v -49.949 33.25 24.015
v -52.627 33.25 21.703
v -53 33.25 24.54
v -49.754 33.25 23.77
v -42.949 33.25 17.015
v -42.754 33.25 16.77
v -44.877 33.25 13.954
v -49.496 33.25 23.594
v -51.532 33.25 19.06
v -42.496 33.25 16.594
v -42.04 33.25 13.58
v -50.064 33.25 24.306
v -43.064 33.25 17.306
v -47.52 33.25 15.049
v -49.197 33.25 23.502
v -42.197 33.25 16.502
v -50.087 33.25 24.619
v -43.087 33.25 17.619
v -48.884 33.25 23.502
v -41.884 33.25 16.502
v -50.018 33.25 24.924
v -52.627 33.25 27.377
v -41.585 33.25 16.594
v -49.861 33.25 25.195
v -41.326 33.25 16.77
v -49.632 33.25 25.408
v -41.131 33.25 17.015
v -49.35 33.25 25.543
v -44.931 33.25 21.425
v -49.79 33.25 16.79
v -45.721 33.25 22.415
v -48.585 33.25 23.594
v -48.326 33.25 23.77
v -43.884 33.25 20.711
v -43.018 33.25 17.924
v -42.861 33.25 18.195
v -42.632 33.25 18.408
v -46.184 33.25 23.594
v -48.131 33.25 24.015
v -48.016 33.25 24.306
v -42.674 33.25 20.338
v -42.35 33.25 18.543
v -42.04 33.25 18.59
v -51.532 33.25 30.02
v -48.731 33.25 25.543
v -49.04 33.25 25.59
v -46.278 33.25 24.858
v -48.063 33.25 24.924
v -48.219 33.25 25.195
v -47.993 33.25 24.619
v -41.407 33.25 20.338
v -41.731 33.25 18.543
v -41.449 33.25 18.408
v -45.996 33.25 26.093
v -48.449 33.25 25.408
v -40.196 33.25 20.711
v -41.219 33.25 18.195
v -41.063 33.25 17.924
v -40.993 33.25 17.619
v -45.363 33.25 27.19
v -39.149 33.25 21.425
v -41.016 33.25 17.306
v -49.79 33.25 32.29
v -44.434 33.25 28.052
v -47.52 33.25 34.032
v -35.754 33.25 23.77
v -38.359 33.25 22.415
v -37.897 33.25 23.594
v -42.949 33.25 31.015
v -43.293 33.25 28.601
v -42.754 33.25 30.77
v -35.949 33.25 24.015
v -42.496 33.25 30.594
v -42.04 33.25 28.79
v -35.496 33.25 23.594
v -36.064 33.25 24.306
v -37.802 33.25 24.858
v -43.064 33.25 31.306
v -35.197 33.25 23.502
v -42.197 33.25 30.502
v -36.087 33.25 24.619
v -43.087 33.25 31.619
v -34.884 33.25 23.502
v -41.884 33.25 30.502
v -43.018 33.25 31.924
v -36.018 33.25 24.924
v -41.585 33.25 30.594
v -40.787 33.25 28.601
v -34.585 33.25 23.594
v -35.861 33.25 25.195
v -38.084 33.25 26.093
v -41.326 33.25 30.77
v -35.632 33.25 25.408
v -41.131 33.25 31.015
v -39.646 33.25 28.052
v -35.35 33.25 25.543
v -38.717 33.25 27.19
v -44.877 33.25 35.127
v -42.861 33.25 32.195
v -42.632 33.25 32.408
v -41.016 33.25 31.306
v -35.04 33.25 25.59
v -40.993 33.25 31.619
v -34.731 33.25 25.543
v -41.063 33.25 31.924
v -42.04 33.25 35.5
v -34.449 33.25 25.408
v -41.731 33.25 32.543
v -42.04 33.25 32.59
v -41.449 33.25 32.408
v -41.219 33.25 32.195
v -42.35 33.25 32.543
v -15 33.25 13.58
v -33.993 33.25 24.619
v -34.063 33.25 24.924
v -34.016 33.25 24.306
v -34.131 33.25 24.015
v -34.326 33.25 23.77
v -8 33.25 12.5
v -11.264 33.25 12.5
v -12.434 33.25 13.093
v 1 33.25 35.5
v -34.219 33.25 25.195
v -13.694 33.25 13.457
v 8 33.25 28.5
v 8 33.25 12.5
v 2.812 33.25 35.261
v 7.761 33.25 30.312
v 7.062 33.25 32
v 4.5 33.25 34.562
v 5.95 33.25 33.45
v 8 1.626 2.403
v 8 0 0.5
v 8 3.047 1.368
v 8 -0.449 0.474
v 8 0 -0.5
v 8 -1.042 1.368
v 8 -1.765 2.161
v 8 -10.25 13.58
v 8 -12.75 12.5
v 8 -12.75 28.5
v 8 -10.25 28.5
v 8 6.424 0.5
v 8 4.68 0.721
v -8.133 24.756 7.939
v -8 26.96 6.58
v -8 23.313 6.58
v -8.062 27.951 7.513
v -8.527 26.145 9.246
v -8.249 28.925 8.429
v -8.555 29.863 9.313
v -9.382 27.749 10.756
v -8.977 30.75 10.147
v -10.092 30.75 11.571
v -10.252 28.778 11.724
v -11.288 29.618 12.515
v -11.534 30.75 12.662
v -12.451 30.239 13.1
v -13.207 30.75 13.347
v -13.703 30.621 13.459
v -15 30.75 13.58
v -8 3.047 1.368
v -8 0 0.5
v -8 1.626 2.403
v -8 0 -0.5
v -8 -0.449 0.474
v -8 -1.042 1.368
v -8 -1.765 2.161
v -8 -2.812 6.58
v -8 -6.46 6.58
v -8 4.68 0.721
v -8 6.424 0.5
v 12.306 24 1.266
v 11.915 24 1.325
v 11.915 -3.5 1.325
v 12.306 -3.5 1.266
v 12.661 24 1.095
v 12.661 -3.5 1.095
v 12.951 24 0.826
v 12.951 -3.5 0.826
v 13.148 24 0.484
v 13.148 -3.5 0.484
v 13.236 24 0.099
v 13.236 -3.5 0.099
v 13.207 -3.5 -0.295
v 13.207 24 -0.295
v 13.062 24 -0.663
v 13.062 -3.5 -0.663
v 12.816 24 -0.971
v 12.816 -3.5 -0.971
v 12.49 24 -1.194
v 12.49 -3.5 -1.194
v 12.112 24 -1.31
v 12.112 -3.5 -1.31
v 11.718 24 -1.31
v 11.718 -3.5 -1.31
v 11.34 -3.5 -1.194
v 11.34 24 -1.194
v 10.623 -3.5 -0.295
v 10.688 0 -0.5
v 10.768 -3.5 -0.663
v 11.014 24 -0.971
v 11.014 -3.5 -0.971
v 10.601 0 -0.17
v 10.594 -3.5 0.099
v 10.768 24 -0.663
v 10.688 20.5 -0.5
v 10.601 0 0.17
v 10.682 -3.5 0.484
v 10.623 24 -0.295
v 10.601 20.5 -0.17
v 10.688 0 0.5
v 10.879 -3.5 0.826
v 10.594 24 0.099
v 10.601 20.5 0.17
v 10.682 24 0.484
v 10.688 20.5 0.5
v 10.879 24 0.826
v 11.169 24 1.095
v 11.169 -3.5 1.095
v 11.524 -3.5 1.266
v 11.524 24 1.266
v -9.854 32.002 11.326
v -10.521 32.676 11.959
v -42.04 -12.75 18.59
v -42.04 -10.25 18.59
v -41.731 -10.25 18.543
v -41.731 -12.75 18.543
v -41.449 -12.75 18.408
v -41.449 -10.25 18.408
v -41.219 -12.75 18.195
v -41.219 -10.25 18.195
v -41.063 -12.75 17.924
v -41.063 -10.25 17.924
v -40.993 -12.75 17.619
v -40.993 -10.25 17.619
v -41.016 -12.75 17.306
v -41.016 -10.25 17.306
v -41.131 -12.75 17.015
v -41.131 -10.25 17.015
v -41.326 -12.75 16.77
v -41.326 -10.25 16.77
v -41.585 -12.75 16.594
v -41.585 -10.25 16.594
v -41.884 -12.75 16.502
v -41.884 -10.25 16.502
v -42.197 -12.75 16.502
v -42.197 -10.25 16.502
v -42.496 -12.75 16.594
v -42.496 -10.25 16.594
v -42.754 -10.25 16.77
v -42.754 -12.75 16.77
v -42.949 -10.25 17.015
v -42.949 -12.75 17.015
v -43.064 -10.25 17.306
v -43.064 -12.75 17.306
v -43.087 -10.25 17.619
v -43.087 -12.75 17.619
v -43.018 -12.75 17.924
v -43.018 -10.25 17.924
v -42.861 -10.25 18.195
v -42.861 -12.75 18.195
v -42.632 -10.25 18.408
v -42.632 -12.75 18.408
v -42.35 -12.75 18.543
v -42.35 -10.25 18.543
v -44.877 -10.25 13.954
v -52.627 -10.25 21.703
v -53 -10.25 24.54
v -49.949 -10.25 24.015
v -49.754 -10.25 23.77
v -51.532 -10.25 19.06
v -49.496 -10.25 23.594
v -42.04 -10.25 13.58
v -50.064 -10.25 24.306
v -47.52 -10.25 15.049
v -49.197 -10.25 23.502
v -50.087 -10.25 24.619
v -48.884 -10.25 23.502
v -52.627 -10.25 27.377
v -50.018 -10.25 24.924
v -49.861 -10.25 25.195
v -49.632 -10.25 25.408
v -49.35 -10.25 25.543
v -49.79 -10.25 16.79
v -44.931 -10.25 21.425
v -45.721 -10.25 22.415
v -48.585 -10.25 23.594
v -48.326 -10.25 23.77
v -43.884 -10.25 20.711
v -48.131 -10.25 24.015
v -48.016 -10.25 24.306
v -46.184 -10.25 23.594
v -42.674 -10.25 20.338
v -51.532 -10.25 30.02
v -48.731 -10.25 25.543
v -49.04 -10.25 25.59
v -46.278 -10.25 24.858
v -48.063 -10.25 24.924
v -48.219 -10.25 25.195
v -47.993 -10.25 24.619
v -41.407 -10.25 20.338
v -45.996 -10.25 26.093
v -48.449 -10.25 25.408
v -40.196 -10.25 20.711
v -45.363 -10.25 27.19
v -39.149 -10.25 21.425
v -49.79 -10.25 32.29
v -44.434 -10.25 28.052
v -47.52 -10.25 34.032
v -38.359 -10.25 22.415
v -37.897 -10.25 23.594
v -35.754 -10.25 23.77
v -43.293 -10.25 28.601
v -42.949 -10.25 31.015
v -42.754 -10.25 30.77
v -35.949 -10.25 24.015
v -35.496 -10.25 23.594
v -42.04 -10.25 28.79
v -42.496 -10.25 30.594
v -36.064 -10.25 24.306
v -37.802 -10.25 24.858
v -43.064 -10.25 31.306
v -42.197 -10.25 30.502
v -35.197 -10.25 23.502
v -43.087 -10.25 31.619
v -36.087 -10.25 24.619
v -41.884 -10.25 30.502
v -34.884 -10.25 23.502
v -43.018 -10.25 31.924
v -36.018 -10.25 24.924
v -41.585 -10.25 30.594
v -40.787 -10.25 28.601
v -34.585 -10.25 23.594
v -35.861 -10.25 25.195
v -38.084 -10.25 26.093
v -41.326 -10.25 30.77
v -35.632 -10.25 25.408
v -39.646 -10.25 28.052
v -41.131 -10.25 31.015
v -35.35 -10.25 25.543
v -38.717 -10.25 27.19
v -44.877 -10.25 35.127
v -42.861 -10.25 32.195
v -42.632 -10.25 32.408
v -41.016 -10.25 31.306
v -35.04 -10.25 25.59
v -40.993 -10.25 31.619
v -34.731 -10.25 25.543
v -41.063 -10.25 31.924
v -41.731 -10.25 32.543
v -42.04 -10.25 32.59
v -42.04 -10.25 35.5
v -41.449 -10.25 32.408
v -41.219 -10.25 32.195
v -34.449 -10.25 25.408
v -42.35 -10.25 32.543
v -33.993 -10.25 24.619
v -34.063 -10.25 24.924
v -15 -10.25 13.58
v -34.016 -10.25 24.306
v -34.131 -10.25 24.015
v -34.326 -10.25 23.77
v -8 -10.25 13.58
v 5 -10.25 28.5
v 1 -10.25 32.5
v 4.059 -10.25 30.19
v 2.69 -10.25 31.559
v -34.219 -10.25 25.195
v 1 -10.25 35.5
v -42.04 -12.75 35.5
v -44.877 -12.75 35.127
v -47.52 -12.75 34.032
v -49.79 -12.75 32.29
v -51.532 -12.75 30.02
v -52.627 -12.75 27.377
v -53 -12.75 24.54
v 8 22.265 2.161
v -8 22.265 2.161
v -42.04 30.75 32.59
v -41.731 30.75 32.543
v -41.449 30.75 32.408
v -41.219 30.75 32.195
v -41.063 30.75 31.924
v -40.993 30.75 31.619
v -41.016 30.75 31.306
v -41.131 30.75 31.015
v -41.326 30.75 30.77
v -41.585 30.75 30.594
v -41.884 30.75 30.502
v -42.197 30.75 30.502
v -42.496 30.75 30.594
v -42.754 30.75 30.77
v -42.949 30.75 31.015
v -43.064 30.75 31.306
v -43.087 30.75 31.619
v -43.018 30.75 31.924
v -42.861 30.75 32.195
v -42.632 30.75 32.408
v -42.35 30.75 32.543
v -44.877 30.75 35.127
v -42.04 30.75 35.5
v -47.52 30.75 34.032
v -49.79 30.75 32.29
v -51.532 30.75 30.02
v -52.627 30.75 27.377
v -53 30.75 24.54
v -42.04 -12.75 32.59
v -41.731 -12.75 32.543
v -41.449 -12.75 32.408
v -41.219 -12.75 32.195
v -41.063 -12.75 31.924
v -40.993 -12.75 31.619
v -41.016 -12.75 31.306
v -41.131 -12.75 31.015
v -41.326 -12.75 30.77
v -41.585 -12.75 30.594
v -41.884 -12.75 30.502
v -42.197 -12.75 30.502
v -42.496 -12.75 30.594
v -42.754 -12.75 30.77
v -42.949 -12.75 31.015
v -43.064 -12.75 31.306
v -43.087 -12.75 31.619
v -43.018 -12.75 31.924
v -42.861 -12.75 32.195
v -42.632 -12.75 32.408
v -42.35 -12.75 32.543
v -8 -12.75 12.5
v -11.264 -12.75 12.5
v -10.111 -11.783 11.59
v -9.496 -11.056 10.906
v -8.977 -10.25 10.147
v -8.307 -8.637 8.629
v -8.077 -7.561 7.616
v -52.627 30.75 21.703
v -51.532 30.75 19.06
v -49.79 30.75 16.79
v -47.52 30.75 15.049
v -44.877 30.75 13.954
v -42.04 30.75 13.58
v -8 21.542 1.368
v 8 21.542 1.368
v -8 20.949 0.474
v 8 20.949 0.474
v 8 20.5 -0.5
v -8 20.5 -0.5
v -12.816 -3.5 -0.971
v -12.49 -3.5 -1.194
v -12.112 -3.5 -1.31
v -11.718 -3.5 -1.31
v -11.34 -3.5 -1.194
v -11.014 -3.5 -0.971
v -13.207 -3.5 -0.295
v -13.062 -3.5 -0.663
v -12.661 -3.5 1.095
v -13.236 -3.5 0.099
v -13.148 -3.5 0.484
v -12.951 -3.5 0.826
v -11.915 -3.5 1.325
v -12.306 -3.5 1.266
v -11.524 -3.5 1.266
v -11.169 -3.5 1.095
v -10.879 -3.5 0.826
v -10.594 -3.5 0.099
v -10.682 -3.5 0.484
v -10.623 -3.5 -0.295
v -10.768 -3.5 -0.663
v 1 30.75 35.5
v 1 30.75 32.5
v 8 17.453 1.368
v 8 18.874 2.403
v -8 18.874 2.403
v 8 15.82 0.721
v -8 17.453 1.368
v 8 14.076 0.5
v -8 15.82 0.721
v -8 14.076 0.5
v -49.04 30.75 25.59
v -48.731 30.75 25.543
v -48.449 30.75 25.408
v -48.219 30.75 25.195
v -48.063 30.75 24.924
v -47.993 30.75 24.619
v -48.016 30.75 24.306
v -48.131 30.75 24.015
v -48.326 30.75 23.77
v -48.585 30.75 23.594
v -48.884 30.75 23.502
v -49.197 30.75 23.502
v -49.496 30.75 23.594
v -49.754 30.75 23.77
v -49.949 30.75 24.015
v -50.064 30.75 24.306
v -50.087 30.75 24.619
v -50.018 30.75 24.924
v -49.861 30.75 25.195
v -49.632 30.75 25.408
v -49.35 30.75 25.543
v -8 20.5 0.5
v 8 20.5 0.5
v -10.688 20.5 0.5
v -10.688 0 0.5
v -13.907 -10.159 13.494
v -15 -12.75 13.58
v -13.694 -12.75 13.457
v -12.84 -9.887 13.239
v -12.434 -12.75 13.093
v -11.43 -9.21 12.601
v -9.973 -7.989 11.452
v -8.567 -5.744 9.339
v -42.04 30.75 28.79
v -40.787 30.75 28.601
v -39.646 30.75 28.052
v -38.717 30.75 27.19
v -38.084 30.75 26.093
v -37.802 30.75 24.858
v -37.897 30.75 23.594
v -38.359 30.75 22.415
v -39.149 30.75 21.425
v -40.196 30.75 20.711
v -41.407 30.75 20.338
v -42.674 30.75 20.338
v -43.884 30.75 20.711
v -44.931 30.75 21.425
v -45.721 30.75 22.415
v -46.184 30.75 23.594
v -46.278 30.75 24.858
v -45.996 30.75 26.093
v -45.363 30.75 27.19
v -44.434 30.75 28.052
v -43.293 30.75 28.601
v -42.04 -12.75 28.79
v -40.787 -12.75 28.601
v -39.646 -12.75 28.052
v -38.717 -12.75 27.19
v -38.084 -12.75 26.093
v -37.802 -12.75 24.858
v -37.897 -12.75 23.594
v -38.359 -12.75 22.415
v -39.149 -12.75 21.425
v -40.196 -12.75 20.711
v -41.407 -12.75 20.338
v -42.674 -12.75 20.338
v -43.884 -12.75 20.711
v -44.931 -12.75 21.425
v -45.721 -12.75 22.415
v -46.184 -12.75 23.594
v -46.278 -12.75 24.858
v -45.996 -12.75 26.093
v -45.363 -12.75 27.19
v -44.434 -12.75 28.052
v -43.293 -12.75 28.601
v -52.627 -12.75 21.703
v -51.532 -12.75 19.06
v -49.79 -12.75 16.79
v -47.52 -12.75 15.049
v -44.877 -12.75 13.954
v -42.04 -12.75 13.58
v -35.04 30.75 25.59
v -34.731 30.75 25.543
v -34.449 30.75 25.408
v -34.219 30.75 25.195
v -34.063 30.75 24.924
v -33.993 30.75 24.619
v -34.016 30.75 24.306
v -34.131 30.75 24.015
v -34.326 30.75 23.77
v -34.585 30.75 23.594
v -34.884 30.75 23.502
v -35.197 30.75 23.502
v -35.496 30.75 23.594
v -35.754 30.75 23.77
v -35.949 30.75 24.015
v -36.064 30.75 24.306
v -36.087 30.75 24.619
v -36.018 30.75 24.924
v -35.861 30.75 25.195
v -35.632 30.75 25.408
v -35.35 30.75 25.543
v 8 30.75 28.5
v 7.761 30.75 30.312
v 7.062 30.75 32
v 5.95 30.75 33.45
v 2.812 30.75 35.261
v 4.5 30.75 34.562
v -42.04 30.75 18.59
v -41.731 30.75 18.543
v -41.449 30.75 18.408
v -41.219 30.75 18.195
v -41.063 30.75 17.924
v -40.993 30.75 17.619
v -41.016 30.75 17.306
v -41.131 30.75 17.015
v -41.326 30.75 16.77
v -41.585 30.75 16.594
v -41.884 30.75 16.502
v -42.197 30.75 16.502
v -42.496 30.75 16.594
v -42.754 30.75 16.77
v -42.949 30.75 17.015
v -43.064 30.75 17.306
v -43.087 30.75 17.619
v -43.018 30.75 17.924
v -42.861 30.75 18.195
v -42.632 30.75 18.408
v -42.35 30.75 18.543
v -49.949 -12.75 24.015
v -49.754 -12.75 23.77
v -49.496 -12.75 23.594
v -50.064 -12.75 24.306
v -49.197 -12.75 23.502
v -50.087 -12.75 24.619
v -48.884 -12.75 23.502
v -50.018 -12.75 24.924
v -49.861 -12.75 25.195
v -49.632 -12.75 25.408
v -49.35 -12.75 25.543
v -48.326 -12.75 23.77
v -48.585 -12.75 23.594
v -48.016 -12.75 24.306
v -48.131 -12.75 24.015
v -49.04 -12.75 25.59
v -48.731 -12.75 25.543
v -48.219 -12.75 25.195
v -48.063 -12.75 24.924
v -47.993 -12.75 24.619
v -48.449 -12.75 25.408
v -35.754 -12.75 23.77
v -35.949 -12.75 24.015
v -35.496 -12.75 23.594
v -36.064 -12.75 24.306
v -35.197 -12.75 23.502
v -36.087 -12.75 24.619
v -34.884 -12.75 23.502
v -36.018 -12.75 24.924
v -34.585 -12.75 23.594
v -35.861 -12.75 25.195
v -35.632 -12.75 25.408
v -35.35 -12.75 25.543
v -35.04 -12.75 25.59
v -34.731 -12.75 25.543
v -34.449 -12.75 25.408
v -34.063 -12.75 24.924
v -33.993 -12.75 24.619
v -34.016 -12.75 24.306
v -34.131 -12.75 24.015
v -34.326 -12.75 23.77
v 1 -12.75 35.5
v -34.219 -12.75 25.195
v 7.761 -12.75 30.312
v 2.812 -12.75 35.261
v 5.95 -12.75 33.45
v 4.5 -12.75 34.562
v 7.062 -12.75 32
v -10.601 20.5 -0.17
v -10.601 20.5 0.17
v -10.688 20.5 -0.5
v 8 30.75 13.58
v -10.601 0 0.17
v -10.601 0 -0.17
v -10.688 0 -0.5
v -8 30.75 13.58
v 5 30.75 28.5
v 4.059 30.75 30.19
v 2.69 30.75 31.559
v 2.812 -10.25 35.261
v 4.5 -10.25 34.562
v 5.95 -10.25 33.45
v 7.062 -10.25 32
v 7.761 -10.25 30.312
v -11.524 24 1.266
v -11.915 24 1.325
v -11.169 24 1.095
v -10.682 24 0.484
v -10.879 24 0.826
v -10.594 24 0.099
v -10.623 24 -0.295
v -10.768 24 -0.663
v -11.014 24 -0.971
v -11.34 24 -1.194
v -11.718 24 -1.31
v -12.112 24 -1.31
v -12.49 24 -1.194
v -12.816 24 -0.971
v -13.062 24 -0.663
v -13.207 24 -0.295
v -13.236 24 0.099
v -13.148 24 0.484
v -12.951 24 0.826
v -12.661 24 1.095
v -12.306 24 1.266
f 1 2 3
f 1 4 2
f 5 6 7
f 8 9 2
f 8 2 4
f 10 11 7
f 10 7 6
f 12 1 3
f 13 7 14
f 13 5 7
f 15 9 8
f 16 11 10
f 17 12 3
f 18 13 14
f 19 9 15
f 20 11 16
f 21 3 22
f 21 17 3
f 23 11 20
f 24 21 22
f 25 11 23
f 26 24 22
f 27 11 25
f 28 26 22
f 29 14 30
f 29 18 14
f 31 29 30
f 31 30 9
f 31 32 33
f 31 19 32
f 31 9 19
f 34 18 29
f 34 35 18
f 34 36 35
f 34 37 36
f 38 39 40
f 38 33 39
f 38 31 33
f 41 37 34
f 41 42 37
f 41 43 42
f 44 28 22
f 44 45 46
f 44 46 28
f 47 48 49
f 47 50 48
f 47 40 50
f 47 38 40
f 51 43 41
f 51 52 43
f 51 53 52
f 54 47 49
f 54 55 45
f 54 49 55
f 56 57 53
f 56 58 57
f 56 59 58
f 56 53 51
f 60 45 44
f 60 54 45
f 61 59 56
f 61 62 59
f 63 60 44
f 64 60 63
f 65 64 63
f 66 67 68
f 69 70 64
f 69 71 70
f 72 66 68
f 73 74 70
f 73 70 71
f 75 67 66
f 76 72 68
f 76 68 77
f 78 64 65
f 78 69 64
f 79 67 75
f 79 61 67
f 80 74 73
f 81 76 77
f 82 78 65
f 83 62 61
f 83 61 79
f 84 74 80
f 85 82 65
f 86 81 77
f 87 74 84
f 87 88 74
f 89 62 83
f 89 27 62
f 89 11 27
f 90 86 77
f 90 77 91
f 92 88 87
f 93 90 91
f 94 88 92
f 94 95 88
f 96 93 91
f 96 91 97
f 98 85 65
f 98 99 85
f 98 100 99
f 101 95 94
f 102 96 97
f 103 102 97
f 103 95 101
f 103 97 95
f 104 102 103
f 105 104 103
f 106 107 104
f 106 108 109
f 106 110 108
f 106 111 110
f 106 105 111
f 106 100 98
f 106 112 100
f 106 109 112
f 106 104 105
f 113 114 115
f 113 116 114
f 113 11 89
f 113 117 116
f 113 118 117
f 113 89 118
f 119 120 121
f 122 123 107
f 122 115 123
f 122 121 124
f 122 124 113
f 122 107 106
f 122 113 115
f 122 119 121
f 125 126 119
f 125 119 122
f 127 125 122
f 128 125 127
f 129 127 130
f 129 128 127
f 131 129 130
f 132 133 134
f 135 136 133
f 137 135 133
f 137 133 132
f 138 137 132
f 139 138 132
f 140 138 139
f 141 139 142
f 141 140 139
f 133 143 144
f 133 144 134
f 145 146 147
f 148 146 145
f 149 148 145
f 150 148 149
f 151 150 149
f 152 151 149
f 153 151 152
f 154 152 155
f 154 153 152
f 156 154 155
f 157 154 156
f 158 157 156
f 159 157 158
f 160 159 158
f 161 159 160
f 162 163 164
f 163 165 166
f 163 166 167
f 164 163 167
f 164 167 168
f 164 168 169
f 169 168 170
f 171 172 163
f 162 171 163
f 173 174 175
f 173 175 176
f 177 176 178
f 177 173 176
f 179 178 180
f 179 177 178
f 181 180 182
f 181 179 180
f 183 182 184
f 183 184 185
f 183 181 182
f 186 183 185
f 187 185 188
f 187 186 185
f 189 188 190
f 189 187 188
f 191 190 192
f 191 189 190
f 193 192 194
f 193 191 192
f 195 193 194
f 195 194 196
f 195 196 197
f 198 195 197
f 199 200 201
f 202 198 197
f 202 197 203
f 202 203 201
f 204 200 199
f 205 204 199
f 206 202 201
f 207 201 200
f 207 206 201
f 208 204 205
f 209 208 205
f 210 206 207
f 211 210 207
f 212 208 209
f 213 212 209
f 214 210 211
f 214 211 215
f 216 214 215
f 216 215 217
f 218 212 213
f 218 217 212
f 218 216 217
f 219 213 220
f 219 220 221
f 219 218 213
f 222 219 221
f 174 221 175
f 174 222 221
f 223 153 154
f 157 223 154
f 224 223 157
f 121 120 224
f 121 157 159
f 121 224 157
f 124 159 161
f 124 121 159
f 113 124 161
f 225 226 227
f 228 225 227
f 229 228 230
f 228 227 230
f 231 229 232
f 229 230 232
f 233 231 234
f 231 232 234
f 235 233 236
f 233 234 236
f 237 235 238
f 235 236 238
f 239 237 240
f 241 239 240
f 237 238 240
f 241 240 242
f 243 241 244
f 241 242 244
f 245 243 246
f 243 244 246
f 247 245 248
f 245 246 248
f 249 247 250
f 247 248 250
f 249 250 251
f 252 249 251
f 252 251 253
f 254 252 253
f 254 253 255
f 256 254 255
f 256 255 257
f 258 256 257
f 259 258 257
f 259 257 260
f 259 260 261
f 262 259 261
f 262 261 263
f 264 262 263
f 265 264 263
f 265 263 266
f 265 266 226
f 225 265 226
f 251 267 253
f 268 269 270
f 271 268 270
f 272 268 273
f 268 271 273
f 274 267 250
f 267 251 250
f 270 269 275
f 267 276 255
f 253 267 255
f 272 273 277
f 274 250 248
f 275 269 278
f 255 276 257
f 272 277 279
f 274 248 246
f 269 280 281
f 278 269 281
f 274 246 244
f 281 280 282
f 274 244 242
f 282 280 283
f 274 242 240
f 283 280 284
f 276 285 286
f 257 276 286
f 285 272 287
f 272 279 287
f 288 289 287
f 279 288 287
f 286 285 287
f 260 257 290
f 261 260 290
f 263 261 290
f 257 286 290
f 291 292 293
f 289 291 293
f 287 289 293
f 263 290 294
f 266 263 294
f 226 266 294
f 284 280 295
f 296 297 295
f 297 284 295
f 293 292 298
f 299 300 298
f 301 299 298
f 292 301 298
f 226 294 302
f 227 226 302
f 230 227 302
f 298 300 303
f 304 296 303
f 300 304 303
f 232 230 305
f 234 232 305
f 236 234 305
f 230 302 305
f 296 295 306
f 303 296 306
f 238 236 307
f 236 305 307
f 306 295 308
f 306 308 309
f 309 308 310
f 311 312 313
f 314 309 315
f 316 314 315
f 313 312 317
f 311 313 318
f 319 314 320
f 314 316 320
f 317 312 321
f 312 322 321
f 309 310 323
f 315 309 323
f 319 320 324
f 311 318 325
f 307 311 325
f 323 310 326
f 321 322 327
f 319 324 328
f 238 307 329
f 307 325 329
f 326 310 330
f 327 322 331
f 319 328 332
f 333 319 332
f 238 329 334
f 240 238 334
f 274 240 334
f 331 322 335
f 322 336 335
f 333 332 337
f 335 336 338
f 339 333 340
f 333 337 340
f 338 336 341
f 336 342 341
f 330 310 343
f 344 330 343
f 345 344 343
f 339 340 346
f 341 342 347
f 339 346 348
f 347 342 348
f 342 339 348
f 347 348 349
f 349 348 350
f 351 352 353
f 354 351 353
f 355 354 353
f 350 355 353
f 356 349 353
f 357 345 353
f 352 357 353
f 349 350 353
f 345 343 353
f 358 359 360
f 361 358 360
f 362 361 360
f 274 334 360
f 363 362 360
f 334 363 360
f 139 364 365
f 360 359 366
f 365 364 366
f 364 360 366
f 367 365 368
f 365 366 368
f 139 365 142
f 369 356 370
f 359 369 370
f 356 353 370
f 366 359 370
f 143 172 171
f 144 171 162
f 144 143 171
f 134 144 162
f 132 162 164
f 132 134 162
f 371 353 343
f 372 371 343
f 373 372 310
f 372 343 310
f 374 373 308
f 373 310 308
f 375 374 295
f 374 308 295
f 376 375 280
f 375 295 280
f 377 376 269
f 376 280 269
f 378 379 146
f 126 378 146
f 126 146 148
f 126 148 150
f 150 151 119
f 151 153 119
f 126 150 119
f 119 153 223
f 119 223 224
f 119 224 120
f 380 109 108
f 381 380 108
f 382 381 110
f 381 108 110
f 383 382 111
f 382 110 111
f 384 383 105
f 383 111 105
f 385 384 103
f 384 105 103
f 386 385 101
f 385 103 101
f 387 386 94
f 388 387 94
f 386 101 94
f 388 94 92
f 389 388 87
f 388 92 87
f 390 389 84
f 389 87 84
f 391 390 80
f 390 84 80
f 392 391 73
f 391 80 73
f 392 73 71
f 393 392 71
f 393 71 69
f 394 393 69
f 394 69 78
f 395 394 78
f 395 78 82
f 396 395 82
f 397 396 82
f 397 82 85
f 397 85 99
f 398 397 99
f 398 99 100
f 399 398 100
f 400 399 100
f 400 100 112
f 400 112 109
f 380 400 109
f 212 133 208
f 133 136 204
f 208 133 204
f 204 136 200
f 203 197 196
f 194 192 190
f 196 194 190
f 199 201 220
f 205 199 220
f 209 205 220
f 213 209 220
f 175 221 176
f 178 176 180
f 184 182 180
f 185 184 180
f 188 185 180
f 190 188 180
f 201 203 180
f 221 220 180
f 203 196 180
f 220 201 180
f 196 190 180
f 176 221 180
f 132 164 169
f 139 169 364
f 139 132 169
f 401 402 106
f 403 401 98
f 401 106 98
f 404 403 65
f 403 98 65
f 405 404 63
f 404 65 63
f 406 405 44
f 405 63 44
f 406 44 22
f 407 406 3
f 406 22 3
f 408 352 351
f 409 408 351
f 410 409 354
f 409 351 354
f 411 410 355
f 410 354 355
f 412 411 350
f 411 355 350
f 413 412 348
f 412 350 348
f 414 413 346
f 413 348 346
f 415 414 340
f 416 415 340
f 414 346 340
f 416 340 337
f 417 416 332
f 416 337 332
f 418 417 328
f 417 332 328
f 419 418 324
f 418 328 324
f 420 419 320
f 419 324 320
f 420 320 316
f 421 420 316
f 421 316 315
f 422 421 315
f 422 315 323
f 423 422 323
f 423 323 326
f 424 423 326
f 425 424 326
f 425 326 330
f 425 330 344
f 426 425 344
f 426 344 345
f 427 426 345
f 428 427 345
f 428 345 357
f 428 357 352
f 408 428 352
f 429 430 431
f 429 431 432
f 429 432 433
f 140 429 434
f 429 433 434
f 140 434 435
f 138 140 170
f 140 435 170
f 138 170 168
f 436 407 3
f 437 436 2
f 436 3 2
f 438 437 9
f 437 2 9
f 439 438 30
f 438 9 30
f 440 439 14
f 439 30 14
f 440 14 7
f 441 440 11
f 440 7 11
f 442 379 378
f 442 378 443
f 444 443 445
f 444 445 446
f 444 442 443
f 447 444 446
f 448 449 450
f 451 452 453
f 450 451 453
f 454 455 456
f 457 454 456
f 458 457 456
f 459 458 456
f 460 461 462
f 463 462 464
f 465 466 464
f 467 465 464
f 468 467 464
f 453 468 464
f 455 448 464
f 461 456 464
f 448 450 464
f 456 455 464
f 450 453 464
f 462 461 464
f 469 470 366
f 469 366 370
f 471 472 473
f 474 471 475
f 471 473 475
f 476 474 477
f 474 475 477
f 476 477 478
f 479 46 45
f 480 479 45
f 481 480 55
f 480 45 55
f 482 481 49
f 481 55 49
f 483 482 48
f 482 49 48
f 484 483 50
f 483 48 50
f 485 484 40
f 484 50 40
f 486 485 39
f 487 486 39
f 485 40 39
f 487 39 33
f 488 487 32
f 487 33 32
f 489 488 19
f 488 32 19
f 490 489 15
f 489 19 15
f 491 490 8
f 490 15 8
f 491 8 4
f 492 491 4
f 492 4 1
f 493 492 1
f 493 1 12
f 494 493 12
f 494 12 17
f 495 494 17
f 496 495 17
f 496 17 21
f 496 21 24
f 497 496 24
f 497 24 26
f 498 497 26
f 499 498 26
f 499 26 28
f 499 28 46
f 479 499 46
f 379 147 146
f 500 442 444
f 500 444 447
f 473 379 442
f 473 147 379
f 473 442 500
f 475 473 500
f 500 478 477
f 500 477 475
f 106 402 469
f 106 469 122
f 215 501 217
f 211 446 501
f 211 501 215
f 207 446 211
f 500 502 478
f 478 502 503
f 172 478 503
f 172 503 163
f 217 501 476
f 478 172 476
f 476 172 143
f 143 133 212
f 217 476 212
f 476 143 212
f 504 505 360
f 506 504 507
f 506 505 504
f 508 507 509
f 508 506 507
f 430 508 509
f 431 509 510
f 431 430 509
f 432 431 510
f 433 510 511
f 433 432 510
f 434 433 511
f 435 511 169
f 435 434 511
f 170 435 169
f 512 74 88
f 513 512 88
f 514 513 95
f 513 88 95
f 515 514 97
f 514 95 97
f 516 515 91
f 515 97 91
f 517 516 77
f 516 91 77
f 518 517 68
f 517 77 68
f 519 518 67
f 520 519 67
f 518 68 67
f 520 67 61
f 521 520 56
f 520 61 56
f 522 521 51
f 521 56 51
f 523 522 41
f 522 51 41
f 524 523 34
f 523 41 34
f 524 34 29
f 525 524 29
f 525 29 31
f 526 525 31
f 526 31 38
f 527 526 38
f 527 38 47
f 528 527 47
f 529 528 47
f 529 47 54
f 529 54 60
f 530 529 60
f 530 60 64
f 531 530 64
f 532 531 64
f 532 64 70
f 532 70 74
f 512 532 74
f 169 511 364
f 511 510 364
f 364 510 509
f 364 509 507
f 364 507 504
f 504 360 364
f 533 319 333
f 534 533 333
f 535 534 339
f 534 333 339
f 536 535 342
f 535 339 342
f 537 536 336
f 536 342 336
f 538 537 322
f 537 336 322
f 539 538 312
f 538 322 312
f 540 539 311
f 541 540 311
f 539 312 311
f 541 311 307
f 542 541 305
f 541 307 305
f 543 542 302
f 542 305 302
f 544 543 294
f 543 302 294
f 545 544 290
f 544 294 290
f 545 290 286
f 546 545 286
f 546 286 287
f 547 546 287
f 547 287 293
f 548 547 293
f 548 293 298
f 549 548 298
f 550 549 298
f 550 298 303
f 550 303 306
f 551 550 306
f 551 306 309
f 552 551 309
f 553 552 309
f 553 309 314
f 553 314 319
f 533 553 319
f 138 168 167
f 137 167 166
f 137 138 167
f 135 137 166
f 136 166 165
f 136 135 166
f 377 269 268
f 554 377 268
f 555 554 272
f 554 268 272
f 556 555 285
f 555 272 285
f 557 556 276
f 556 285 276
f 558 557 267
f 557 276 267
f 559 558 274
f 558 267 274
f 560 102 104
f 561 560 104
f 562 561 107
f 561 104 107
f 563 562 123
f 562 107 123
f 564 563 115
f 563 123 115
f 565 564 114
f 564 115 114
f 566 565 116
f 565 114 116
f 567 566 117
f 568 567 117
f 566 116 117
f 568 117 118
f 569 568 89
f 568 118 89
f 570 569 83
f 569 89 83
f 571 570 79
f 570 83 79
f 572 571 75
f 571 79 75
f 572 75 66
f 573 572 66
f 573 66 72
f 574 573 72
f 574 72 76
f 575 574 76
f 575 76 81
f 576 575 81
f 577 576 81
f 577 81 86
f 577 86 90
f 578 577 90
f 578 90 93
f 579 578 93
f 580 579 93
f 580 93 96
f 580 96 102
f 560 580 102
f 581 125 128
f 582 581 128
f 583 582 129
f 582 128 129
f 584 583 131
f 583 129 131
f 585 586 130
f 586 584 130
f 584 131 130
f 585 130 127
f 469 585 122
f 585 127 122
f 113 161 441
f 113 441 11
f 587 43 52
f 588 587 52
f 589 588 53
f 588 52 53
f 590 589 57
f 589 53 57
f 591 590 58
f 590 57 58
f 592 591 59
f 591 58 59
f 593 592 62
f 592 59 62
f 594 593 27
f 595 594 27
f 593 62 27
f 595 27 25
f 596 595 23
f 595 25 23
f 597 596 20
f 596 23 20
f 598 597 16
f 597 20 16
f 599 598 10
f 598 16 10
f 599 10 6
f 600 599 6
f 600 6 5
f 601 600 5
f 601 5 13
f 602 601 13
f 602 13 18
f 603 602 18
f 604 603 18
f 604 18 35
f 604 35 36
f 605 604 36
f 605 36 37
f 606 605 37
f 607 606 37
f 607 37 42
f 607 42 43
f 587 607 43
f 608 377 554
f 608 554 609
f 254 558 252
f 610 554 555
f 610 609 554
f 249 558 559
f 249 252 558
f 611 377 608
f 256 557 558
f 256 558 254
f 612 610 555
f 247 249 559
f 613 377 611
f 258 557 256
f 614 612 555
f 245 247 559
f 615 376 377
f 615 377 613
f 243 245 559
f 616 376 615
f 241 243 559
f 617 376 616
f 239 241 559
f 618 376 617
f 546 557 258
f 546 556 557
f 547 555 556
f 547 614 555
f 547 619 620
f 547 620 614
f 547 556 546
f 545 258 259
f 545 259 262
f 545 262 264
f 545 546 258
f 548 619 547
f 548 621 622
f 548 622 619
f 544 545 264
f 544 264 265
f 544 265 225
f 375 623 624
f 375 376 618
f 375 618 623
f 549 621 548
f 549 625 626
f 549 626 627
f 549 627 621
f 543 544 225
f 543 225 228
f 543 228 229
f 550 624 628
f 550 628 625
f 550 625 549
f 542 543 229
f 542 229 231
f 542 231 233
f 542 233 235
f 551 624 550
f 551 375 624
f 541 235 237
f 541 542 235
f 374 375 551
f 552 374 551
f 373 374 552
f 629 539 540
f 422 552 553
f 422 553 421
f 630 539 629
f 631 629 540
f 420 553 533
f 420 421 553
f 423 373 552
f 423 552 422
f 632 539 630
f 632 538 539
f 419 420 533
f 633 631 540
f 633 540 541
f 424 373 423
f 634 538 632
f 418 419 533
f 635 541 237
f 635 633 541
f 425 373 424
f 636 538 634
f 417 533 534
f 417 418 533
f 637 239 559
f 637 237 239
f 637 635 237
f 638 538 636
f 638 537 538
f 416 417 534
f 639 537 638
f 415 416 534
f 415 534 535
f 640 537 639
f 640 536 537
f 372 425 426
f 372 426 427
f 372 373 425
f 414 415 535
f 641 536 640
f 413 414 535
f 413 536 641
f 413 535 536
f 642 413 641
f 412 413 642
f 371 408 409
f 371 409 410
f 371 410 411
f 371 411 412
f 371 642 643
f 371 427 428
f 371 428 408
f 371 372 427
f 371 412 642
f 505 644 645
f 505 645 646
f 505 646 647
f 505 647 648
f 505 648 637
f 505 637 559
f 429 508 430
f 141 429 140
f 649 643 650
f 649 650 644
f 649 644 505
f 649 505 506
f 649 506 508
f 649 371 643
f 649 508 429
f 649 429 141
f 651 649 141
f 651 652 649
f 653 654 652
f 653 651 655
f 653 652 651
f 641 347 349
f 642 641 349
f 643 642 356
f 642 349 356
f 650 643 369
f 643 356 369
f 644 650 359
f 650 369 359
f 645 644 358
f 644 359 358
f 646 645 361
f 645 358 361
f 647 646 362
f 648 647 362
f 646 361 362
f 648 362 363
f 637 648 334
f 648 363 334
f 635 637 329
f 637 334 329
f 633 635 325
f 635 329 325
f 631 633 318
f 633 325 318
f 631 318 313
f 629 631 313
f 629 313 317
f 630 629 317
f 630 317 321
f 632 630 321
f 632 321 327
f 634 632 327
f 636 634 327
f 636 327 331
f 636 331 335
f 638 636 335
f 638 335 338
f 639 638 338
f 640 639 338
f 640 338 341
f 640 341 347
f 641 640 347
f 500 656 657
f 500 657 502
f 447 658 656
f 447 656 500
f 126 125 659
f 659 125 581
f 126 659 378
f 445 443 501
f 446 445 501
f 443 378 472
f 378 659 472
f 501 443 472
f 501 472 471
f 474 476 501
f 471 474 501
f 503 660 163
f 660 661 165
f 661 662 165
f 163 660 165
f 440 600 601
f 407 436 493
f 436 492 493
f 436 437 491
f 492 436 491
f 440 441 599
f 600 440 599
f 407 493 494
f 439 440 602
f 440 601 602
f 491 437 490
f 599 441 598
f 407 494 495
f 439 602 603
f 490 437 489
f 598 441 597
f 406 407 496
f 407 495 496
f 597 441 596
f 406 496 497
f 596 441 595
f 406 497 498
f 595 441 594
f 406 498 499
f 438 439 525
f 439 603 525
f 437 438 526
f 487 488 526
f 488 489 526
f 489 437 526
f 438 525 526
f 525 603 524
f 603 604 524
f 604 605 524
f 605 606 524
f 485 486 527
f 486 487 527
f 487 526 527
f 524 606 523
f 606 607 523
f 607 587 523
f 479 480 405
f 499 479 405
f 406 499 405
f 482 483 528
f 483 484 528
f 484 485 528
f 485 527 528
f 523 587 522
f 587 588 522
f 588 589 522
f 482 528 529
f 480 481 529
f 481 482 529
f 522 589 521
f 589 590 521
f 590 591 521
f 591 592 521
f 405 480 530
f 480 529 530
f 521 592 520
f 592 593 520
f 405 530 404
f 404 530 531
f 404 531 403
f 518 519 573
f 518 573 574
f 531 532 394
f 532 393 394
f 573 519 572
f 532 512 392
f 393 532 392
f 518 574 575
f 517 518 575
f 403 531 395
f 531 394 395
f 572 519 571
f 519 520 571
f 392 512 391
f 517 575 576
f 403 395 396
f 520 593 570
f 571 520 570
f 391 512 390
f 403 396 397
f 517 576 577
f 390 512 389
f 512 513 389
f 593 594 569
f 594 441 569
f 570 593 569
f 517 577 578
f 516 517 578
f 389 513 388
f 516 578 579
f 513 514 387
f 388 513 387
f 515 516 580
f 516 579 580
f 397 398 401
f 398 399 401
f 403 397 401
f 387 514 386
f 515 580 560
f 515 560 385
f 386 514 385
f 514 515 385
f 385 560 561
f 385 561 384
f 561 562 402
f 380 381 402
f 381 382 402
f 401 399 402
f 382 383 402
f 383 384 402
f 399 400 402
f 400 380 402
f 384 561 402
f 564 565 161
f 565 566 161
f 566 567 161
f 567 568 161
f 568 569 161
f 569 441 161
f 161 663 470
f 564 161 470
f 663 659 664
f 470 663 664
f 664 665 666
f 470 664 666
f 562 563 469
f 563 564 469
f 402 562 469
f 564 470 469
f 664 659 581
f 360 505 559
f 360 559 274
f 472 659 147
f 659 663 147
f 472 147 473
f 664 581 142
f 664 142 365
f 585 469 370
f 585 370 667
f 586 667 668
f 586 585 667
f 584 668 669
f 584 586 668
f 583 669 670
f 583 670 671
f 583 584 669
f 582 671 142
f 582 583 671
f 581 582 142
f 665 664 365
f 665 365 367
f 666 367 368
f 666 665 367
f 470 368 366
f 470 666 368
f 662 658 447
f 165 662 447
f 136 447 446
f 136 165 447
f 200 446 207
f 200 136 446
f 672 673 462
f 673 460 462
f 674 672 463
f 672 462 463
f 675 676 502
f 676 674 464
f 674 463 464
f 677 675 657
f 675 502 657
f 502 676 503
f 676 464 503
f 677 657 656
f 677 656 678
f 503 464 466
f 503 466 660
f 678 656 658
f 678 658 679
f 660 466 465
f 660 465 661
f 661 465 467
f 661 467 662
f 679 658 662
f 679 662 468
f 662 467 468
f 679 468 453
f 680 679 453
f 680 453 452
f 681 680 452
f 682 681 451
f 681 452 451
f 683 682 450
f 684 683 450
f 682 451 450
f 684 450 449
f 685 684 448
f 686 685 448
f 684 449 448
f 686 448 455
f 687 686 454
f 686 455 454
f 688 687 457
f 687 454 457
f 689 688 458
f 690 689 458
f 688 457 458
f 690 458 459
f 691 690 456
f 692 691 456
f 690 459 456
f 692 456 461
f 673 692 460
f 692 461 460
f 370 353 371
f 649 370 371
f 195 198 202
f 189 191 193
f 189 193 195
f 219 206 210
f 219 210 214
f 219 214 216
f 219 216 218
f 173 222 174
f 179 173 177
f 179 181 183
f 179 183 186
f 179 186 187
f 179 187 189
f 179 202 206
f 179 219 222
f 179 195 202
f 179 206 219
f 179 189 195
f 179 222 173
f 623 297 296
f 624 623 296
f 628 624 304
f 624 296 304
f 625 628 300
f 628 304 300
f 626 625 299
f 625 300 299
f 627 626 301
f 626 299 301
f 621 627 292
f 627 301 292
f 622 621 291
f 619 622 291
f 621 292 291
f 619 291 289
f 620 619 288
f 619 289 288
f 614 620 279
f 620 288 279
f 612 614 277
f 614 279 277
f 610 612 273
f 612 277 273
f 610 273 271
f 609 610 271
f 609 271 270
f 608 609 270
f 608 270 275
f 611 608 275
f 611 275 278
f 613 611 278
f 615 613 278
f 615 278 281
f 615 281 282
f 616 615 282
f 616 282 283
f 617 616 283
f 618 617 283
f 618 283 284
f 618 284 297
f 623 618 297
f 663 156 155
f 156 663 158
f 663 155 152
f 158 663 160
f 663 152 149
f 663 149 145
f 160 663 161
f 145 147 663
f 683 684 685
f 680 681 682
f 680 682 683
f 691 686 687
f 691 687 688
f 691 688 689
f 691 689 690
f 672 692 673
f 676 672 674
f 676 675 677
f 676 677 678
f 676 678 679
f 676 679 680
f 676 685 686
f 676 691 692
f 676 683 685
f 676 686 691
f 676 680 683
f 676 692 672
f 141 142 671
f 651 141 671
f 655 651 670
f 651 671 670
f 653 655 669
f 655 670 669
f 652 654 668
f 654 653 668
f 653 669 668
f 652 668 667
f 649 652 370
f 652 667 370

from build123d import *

# Parameters (mm, degrees)
SKETCH1_W           = 23.83
SKETCH1_H           = 1
BOSS_EXTRUDE1_DEPTH = 20.5
SKETCH2_R           = 1.325
BOSS_EXTRUDE2_DEPTH = 13.75
BOSS_EXTRUDE4_DEPTH = 8
SKETCH5_W           = 21.919818374
SKETCH5_H           = 2.5
BOSS_EXTRUDE5_DEPTH = 45
SKETCH6_R           = 4.25
SKETCH6_R_2         = 1.05
CUT_EXTRUDE1_DEPTH  = 79.646360374
FILLET1_R           = 7
FILLET2_R           = 7
FILLET3_R           = 7
BOSS_EXTRUDE6_START = 41
BOSS_EXTRUDE6_DEPTH = 41


with BuildPart() as part:
    # Sketch1 → Boss-Extrude1 (new body)
    with BuildSketch(Plane(origin=(0, 0, 0), x_dir=(1, 0, 0), z_dir=(0, 1, 0))):
        Rectangle(SKETCH1_W, SKETCH1_H)
    extrude(amount=BOSS_EXTRUDE1_DEPTH)

    # Sketch2 → Boss-Extrude2 (add, symmetric)
    with BuildSketch(Plane(origin=(0, 10.25, 0), x_dir=(1, 0, 0), z_dir=(0, 1, 0))):
        with Locations(Location((-11.915, 0, 0), (0, 0, 270))):
            Circle(SKETCH2_R)
        with Locations(Location((11.915, 0, 0), (0, 0, 270))):
            Circle(SKETCH2_R)
    extrude(amount=BOSS_EXTRUDE2_DEPTH, both=True)

    # Sketch4 → Boss-Extrude4 (add, symmetric)
    with BuildSketch(Plane(origin=(0, 0, 0), x_dir=(0, 0, -1), z_dir=(1, 0, 0))):
        Polygon((-0.5, 16.852307022), (-0.5, 20.5), (-12.5, 33.25), (-35.5, 33.25), (-35.5, 30.75), (-13.580181626, 30.75), align=None)
        Polygon((-0.5, 0), (-0.5, 3.647692978), (-13.580181626, -10.25), (-35.5, -10.25), (-35.5, -12.75), (-12.5, -12.75), align=None)
    extrude(amount=BOSS_EXTRUDE4_DEPTH, both=True)

    # Sketch5 → Boss-Extrude5 (add)
    with BuildSketch(Plane.ZY.offset(8)):
        with Locations((24.540090813, 32)):
            Rectangle(SKETCH5_W, SKETCH5_H)
        with Locations((24.540090813, -11.5)):
            Rectangle(SKETCH5_W, SKETCH5_H)
    extrude(amount=BOSS_EXTRUDE5_DEPTH)

    # Sketch6 → Cut-Extrude1 (cut, through all)
    with BuildSketch(Plane(origin=(0, 33.25, 0), x_dir=(1, 0, 0), z_dir=(0, 1, 0))):
        with Locations(Location((-42.040090813, -24.540090813, 0), (0, 0, 270))):
            Circle(SKETCH6_R)
        with Locations(Location((-49.040090813, -24.540090813, 0), (0, 0, 270))):
            Circle(SKETCH6_R_2)
        with Locations(Location((-42.040090813, -17.540090813, 0), (0, 0, 270))):
            Circle(SKETCH6_R_2)
        with Locations(Location((-35.040090813, -24.540090813, 0), (0, 0, 270))):
            Circle(SKETCH6_R_2)
        with Locations(Location((-42.040090813, -31.540090813, 0), (0, 0, 270))):
            Circle(SKETCH6_R_2)
        with BuildLine():
            ThreePointArc((-53, -24.540090813), (-49.78991692, -16.790264706), (-42.040090813, -13.580181626))
            Line((-42.040090813, -13.580181626), (-53, -13.580181626))
            Line((-53, -13.580181626), (-53, -24.540090813))
        make_face()
        with BuildLine():
            ThreePointArc((-42.040090813, -35.5), (-49.78991692, -32.28991692), (-53, -24.540090813))
            Line((-53, -24.540090813), (-53, -35.5))
            Line((-53, -35.5), (-42.040090813, -35.5))
        make_face()
    extrude(amount=-CUT_EXTRUDE1_DEPTH, mode=Mode.SUBTRACT)

    # Fillet1
    # the kernel refuses this fillet: 7 mm, written as the material it adds along each edge
    with BuildSketch(Plane(origin=(-8, -12.75, 13.580181626), x_dir=(-1, 0, 0), z_dir=(0, 1, 0))) as fillet1_piece_1_section:
        with BuildLine():
            CenterArc((FILLET1_R, -FILLET1_R), FILLET1_R, 90, 90)
            Line((0, -FILLET1_R), (0, 0))
            Line((0, 0), (FILLET1_R, 0))
        make_face()
    fillet1_piece_1 = extrude(amount=2.5, mode=Mode.PRIVATE)
    fillet1_piece_1 = split(fillet1_piece_1, bisect_by=Plane(origin=(-10.020174451, -12.153760937, 11.938833823), z_dir=(0, 0.6853646990049913, 0.7281999926928027)), keep=Keep.TOP, mode=Mode.PRIVATE)
    fillet1_piece_1 = split(fillet1_piece_1, bisect_by=Plane(origin=(-10.020174451, -10.440349189, 13.759333804), z_dir=(0, -0.685364699004991, -0.7281999926928029)), keep=Keep.TOP, mode=Mode.PRIVATE)
    add(fillet1_piece_1)
    with BuildSketch(Plane(origin=(-8, -12.75, 13.580181626), x_dir=(-1, 0, 0), z_dir=(0, 1, 0))) as fillet1_piece_2_section:
        with BuildLine():
            CenterArc((FILLET1_R, -FILLET1_R), FILLET1_R, 90, 90)
            Line((0, -FILLET1_R), (0, 0))
            Line((0, 0), (FILLET1_R, 0))
        make_face()
    fillet1_piece_2 = extrude(amount=20, mode=Mode.PRIVATE)
    fillet1_piece_2 = split(fillet1_piece_2, bisect_by=Plane(origin=(-8.816209607, -9.698679662, 9.628169093), z_dir=(0, 0.6853646990049913, 0.7281999926928027)), keep=Keep.TOP, mode=Mode.PRIVATE)
    fillet1_piece_2 = split(fillet1_piece_2, bisect_by=Plane(origin=(-8.816209607, -10.25, 10.809130305), z_dir=(0, 1, 0)), keep=Keep.TOP, mode=Mode.PRIVATE)
    fillet1_piece_2 = split(fillet1_piece_2, bisect_by=Plane(origin=(-8.816209607, -7.985267914, 11.448669075), z_dir=(0, -0.685364699004991, -0.7281999926928029)), keep=Keep.TOP, mode=Mode.PRIVATE)
    add(fillet1_piece_2)
    with BuildSketch(Plane(origin=(-8, 33.25, 13.580181626), x_dir=(0, 0, -1), z_dir=(0, -1, 0))) as fillet1_piece_3_section:
        with BuildLine():
            CenterArc((FILLET1_R, -FILLET1_R), FILLET1_R, 90, 90)
            Line((0, -FILLET1_R), (0, 0))
            Line((0, 0), (FILLET1_R, 0))
        make_face()
    fillet1_piece_3 = extrude(amount=2.5, mode=Mode.PRIVATE)
    fillet1_piece_3 = split(fillet1_piece_3, bisect_by=Plane(origin=(-10.020174451, 32.653760936, 11.938833823), z_dir=(0, -0.6853646990049912, 0.7281999926928028)), keep=Keep.TOP, mode=Mode.PRIVATE)
    fillet1_piece_3 = split(fillet1_piece_3, bisect_by=Plane(origin=(-10.020174451, 30.940349189, 13.759333804), z_dir=(0, 0.6853646990049909, -0.7281999926928031)), keep=Keep.TOP, mode=Mode.PRIVATE)
    add(fillet1_piece_3)
    with BuildSketch(Plane(origin=(-8, 33.25, 13.580181626), x_dir=(0, 0, -1), z_dir=(0, -1, 0))) as fillet1_piece_4_section:
        with BuildLine():
            CenterArc((FILLET1_R, -FILLET1_R), FILLET1_R, 90, 90)
            Line((0, -FILLET1_R), (0, 0))
            Line((0, 0), (FILLET1_R, 0))
        make_face()
    fillet1_piece_4 = extrude(amount=20, mode=Mode.PRIVATE)
    fillet1_piece_4 = split(fillet1_piece_4, bisect_by=Plane(origin=(-8.816209616, 30.198679665, 9.628169097), z_dir=(0, -0.6853646990049912, 0.7281999926928028)), keep=Keep.TOP, mode=Mode.PRIVATE)
    fillet1_piece_4 = split(fillet1_piece_4, bisect_by=Plane(origin=(-8.816209616, 28.485267918, 11.448669078), z_dir=(0, 0.6853646990049909, -0.7281999926928031)), keep=Keep.TOP, mode=Mode.PRIVATE)
    fillet1_piece_4 = split(fillet1_piece_4, bisect_by=Plane(origin=(-8.816209616, 30.75, 10.809130308), z_dir=(0, -1, 0)), keep=Keep.TOP, mode=Mode.PRIVATE)
    add(fillet1_piece_4)
    # the kernel refuses this fillet: 7 mm, written as the material it takes off along each edge
    with BuildSketch(Plane(origin=(8, 7.25, 35.5), x_dir=(0, 0, -1), z_dir=(0, -1, 0))) as fillet1_2_piece_1:
        with BuildLine():
            CenterArc((FILLET1_R, -FILLET1_R), FILLET1_R, 90, 90)
            Line((0, -FILLET1_R), (0, 0))
            Line((0, 0), (FILLET1_R, 0))
        make_face()
    extrude(amount=37.5, mode=Mode.SUBTRACT)
    with BuildSketch(Plane(origin=(8, 50.75, 35.5), x_dir=(-1, 0, 0), z_dir=(0, -1, 0))) as fillet1_2_piece_2:
        with BuildLine():
            CenterArc((FILLET1_R, FILLET1_R), FILLET1_R, 180, 90)
            Line((0, FILLET1_R), (0, 0))
            Line((0, 0), (FILLET1_R, 0))
        make_face()
    extrude(amount=37.5, mode=Mode.SUBTRACT)

    # Fillet2
    fillet2_edges = [part.edges().sort_by_distance(p)[0] for p in [
        (0, 16.852307022, 0.5),
        (0, 3.647692978, 0.5),
    ]]
    fillet(fillet2_edges, radius=FILLET2_R)

    # Fillet3
    # the kernel refuses this fillet: 7 mm, written as the material it adds along each edge
    with BuildSketch(Plane(origin=(-8, 20.5, 0.5), x_dir=(0, 0.7281999926925888, 0.6853646990052185), z_dir=(1, 0, 0))) as fillet3_piece_1:
        with BuildLine():
            CenterArc((2.423417163, -7), FILLET3_R, 90, 26.366519243)
            Line((-0.685364699, -0.728199993), (0, 0))
            Line((0, 0), (2.423417163, 0))
        make_face()
    extrude(amount=16)
    with BuildSketch(Plane(origin=(8, 0, 0.5), x_dir=(0, 0, -1), z_dir=(-1, 0, 0))) as fillet3_piece_2:
        with BuildLine():
            CenterArc((3.436475374, 6.562285254), FILLET3_R, 223.264295411, 26.366519243)
            Line((-1.660924575, 1.764732361), (0, 0))
            Line((0, 0), (1, 0))
        make_face()
    extrude(amount=16)

    # Sketch8 → Boss-Extrude6 (add)
    with BuildSketch(Plane(origin=(0, -10.25, 0), x_dir=(1, 0, 0), z_dir=(0, 1, 0)).offset(BOSS_EXTRUDE6_START)):
        with BuildLine():
            ThreePointArc((1, -35.5), (5.949747468, -33.449747468), (8, -28.5))
            Line((8, -28.5), (5, -28.5))
            ThreePointArc((5, -28.5), (3.422054899, -30.922054899), (1, -32.5))
            Line((1, -32.5), (1, -35.5))
        make_face()
    extrude(amount=-BOSS_EXTRUDE6_DEPTH)


solid = part.part
